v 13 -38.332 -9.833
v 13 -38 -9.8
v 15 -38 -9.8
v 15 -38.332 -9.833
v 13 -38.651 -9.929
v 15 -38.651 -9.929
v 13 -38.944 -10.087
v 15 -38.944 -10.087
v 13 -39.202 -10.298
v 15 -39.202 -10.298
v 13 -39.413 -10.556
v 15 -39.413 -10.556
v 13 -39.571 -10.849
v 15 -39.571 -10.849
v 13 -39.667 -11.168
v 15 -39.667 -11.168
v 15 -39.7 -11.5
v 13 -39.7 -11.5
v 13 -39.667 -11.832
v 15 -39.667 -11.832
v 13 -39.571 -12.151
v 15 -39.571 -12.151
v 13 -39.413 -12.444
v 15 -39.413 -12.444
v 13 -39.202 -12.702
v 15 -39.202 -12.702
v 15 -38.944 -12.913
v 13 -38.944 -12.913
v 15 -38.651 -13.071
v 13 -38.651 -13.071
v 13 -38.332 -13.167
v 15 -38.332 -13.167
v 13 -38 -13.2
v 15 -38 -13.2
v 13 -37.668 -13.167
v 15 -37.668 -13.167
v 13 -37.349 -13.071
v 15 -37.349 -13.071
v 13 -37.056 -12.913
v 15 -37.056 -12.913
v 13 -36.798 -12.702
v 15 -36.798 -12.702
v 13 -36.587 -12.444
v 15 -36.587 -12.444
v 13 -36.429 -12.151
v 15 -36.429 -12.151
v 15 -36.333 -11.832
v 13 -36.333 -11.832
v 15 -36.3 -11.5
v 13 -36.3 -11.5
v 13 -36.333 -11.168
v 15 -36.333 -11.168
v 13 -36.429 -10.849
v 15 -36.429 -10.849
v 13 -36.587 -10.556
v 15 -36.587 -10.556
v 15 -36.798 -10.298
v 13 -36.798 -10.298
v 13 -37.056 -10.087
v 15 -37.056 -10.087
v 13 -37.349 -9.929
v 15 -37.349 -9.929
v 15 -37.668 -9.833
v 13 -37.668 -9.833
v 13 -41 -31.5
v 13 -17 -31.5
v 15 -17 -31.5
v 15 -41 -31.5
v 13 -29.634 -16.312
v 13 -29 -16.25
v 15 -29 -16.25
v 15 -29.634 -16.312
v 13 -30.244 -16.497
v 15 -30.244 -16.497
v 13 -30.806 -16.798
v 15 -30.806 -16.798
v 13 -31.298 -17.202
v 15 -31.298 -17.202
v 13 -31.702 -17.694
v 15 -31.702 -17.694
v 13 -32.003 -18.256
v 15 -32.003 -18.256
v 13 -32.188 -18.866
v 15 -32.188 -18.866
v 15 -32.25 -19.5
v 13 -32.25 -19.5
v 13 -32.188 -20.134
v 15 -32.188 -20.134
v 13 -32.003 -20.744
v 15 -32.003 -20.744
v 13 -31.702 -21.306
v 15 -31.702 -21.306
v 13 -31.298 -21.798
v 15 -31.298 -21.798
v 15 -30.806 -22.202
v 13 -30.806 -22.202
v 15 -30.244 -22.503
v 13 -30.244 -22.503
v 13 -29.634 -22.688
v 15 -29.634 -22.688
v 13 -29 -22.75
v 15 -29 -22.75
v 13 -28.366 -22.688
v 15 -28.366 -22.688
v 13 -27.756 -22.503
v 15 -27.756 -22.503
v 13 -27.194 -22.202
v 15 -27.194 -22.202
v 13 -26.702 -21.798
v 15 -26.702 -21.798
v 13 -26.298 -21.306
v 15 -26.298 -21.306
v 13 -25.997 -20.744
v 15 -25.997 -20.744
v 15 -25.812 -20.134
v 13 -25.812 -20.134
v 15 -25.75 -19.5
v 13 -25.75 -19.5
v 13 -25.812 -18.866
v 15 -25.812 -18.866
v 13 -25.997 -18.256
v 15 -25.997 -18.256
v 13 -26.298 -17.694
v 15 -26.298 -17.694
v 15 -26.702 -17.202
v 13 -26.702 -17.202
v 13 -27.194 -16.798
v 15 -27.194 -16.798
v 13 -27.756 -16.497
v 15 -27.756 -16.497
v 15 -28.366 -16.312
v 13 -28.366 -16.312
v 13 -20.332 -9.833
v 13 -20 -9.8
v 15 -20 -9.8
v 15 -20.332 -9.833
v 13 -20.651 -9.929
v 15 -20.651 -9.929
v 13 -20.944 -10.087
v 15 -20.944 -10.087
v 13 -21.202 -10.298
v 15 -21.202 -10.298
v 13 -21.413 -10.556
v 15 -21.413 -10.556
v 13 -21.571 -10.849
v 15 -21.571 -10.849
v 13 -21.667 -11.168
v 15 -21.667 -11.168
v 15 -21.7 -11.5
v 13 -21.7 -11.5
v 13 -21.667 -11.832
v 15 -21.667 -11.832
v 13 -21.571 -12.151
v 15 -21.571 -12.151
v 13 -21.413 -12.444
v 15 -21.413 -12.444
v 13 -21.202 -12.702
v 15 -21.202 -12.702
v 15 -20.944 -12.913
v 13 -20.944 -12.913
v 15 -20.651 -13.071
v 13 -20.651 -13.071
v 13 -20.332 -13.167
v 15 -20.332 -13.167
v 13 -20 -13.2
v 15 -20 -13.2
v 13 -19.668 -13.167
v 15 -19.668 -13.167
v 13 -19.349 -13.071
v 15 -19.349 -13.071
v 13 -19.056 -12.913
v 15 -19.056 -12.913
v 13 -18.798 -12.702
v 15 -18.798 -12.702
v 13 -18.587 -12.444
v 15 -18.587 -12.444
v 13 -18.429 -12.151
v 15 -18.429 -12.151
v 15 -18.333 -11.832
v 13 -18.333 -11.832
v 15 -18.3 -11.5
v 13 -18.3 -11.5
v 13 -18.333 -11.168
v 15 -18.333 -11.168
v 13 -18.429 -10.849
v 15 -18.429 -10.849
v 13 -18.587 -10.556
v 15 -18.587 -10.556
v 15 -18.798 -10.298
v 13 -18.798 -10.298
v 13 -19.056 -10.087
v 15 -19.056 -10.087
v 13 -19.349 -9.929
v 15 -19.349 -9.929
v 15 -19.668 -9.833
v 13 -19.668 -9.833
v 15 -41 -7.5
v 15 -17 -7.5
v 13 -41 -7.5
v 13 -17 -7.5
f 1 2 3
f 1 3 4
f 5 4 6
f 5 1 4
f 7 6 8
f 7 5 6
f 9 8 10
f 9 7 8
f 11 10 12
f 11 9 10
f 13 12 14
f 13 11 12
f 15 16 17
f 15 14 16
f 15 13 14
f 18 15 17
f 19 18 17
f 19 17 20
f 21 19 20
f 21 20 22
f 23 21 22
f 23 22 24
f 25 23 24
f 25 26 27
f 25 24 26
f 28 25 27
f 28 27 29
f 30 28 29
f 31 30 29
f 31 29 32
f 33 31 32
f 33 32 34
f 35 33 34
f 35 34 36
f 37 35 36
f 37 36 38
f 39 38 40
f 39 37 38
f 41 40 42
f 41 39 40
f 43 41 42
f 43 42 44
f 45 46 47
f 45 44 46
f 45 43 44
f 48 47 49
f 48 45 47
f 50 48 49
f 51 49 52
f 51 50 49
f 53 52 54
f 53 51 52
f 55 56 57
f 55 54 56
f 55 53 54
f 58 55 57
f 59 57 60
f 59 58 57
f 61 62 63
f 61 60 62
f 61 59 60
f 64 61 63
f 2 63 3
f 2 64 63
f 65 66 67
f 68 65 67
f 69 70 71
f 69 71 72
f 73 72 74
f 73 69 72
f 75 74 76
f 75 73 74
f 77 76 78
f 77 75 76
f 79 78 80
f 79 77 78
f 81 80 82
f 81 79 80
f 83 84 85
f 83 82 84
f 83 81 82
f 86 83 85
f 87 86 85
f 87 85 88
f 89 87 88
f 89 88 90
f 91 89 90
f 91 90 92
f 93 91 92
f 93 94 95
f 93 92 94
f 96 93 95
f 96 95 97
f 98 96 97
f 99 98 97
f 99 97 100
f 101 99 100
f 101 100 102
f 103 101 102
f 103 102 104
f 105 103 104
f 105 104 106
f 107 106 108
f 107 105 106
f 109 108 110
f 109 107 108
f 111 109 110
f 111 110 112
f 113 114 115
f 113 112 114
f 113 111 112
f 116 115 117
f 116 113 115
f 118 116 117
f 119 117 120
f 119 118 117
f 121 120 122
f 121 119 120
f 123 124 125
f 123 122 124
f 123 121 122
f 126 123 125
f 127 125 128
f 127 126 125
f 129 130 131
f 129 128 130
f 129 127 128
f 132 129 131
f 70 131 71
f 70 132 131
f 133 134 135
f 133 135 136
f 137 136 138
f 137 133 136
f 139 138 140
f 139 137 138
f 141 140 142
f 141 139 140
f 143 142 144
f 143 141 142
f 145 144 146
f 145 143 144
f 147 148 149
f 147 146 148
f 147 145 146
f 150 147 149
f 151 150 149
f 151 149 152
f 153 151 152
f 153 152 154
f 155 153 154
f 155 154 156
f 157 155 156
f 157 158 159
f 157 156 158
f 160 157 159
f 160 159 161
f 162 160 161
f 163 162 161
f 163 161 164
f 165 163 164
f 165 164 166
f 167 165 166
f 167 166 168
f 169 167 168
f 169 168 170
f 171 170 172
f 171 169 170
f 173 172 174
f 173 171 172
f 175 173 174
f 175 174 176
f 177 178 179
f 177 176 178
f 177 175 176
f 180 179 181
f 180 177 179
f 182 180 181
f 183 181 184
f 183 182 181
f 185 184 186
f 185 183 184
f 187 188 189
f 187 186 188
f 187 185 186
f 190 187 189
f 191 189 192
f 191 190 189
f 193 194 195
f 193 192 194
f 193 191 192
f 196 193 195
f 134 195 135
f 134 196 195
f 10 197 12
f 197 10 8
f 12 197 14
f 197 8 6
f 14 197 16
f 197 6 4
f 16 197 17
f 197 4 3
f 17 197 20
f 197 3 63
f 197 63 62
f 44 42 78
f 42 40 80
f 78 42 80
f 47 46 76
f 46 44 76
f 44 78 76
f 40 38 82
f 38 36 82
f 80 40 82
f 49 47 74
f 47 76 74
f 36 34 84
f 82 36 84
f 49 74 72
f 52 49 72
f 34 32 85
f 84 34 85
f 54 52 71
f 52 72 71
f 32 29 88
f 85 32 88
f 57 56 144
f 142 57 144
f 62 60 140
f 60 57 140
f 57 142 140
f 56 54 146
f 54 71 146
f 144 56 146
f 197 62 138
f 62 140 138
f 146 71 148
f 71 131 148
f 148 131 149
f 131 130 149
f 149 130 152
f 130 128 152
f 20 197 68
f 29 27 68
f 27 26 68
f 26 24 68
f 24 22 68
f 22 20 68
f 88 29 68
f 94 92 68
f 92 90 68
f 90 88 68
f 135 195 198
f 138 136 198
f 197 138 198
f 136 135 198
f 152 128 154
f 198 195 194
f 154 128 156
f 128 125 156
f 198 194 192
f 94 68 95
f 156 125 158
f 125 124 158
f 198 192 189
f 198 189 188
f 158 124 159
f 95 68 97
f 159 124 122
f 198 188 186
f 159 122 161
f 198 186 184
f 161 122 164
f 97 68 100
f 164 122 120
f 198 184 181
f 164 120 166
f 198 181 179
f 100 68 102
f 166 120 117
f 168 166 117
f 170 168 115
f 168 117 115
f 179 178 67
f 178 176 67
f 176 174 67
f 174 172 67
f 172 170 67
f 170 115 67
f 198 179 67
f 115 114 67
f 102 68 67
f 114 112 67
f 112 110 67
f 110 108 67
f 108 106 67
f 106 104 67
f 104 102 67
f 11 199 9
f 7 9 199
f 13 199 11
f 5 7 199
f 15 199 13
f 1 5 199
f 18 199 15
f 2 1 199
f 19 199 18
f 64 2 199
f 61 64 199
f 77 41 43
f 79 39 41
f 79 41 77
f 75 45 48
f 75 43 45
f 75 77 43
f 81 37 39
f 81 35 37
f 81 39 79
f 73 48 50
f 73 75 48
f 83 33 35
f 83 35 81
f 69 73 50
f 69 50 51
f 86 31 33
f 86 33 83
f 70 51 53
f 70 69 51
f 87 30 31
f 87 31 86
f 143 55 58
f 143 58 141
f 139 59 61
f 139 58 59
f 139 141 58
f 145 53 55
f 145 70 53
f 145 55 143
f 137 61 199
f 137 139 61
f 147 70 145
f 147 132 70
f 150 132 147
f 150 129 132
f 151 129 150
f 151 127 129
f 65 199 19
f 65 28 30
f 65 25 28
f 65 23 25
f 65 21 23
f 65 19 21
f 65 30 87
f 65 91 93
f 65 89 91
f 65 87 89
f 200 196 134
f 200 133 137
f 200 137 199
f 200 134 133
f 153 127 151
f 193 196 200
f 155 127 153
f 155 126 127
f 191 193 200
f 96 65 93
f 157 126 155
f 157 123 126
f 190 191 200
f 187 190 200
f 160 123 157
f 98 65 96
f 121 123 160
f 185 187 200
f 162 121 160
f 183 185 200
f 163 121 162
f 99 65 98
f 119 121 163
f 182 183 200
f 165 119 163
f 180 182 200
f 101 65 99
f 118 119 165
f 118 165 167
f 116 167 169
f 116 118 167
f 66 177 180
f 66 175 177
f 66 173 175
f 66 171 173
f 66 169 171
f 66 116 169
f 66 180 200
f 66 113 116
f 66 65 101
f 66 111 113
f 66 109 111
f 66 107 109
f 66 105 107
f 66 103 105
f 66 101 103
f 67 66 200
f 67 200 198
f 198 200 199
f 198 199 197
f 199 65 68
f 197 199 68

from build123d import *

# Parameters (mm, degrees)
THRUST_PLATE_BLANK_SKETCH_W      = 2
THRUST_PLATE_BLANK_SKETCH_H      = 24
THRUST_PLATE_BLANK_DEPTH         = 24
SCREW_RUNNING_CLEARANCE_SKETCH_R = 3.25
SCREW_RUNNING_CLEARANCE_DEPTH    = 2.2
M3_PLATE_CLEARANCE_1_SKETCH_R    = 1.7
M3_PLATE_CLEARANCE_1_DEPTH       = 2.2
M3_PLATE_CLEARANCE_2_SKETCH_R    = 1.7
M3_PLATE_CLEARANCE_2_DEPTH       = 2.2


with BuildPart() as part:
    # Thrust plate blank sketch → Thrust plate blank (new body)
    with BuildSketch(Plane.XY.offset(-31.5)):
        with Locations((14, -29)):
            Rectangle(THRUST_PLATE_BLANK_SKETCH_W, THRUST_PLATE_BLANK_SKETCH_H)
    extrude(amount=THRUST_PLATE_BLANK_DEPTH)

    # Screw running clearance sketch → Screw running clearance (cut)
    with BuildSketch(Plane(origin=(12.9, 0, 0), x_dir=(0, 0, -1), z_dir=(1, 0, 0))):
        with Locations(Location((19.5, -29, 0), (0, 0, 180))):
            Circle(SCREW_RUNNING_CLEARANCE_SKETCH_R)
    extrude(amount=SCREW_RUNNING_CLEARANCE_DEPTH, mode=Mode.SUBTRACT)

    # M3 plate clearance 1 sketch → M3 plate clearance 1 (cut)
    with BuildSketch(Plane(origin=(12.9, 0, 0), x_dir=(0, 0, -1), z_dir=(1, 0, 0))):
        with Locations(Location((11.5, -38, 0), (0, 0, 180))):
            Circle(M3_PLATE_CLEARANCE_1_SKETCH_R)
    extrude(amount=M3_PLATE_CLEARANCE_1_DEPTH, mode=Mode.SUBTRACT)

    # M3 plate clearance 2 sketch → M3 plate clearance 2 (cut)
    with BuildSketch(Plane(origin=(12.9, 0, 0), x_dir=(0, 0, -1), z_dir=(1, 0, 0))):
        with Locations(Location((11.5, -20, 0), (0, 0, 180))):
            Circle(M3_PLATE_CLEARANCE_2_SKETCH_R)
    extrude(amount=M3_PLATE_CLEARANCE_2_DEPTH, mode=Mode.SUBTRACT)


solid = part.part
